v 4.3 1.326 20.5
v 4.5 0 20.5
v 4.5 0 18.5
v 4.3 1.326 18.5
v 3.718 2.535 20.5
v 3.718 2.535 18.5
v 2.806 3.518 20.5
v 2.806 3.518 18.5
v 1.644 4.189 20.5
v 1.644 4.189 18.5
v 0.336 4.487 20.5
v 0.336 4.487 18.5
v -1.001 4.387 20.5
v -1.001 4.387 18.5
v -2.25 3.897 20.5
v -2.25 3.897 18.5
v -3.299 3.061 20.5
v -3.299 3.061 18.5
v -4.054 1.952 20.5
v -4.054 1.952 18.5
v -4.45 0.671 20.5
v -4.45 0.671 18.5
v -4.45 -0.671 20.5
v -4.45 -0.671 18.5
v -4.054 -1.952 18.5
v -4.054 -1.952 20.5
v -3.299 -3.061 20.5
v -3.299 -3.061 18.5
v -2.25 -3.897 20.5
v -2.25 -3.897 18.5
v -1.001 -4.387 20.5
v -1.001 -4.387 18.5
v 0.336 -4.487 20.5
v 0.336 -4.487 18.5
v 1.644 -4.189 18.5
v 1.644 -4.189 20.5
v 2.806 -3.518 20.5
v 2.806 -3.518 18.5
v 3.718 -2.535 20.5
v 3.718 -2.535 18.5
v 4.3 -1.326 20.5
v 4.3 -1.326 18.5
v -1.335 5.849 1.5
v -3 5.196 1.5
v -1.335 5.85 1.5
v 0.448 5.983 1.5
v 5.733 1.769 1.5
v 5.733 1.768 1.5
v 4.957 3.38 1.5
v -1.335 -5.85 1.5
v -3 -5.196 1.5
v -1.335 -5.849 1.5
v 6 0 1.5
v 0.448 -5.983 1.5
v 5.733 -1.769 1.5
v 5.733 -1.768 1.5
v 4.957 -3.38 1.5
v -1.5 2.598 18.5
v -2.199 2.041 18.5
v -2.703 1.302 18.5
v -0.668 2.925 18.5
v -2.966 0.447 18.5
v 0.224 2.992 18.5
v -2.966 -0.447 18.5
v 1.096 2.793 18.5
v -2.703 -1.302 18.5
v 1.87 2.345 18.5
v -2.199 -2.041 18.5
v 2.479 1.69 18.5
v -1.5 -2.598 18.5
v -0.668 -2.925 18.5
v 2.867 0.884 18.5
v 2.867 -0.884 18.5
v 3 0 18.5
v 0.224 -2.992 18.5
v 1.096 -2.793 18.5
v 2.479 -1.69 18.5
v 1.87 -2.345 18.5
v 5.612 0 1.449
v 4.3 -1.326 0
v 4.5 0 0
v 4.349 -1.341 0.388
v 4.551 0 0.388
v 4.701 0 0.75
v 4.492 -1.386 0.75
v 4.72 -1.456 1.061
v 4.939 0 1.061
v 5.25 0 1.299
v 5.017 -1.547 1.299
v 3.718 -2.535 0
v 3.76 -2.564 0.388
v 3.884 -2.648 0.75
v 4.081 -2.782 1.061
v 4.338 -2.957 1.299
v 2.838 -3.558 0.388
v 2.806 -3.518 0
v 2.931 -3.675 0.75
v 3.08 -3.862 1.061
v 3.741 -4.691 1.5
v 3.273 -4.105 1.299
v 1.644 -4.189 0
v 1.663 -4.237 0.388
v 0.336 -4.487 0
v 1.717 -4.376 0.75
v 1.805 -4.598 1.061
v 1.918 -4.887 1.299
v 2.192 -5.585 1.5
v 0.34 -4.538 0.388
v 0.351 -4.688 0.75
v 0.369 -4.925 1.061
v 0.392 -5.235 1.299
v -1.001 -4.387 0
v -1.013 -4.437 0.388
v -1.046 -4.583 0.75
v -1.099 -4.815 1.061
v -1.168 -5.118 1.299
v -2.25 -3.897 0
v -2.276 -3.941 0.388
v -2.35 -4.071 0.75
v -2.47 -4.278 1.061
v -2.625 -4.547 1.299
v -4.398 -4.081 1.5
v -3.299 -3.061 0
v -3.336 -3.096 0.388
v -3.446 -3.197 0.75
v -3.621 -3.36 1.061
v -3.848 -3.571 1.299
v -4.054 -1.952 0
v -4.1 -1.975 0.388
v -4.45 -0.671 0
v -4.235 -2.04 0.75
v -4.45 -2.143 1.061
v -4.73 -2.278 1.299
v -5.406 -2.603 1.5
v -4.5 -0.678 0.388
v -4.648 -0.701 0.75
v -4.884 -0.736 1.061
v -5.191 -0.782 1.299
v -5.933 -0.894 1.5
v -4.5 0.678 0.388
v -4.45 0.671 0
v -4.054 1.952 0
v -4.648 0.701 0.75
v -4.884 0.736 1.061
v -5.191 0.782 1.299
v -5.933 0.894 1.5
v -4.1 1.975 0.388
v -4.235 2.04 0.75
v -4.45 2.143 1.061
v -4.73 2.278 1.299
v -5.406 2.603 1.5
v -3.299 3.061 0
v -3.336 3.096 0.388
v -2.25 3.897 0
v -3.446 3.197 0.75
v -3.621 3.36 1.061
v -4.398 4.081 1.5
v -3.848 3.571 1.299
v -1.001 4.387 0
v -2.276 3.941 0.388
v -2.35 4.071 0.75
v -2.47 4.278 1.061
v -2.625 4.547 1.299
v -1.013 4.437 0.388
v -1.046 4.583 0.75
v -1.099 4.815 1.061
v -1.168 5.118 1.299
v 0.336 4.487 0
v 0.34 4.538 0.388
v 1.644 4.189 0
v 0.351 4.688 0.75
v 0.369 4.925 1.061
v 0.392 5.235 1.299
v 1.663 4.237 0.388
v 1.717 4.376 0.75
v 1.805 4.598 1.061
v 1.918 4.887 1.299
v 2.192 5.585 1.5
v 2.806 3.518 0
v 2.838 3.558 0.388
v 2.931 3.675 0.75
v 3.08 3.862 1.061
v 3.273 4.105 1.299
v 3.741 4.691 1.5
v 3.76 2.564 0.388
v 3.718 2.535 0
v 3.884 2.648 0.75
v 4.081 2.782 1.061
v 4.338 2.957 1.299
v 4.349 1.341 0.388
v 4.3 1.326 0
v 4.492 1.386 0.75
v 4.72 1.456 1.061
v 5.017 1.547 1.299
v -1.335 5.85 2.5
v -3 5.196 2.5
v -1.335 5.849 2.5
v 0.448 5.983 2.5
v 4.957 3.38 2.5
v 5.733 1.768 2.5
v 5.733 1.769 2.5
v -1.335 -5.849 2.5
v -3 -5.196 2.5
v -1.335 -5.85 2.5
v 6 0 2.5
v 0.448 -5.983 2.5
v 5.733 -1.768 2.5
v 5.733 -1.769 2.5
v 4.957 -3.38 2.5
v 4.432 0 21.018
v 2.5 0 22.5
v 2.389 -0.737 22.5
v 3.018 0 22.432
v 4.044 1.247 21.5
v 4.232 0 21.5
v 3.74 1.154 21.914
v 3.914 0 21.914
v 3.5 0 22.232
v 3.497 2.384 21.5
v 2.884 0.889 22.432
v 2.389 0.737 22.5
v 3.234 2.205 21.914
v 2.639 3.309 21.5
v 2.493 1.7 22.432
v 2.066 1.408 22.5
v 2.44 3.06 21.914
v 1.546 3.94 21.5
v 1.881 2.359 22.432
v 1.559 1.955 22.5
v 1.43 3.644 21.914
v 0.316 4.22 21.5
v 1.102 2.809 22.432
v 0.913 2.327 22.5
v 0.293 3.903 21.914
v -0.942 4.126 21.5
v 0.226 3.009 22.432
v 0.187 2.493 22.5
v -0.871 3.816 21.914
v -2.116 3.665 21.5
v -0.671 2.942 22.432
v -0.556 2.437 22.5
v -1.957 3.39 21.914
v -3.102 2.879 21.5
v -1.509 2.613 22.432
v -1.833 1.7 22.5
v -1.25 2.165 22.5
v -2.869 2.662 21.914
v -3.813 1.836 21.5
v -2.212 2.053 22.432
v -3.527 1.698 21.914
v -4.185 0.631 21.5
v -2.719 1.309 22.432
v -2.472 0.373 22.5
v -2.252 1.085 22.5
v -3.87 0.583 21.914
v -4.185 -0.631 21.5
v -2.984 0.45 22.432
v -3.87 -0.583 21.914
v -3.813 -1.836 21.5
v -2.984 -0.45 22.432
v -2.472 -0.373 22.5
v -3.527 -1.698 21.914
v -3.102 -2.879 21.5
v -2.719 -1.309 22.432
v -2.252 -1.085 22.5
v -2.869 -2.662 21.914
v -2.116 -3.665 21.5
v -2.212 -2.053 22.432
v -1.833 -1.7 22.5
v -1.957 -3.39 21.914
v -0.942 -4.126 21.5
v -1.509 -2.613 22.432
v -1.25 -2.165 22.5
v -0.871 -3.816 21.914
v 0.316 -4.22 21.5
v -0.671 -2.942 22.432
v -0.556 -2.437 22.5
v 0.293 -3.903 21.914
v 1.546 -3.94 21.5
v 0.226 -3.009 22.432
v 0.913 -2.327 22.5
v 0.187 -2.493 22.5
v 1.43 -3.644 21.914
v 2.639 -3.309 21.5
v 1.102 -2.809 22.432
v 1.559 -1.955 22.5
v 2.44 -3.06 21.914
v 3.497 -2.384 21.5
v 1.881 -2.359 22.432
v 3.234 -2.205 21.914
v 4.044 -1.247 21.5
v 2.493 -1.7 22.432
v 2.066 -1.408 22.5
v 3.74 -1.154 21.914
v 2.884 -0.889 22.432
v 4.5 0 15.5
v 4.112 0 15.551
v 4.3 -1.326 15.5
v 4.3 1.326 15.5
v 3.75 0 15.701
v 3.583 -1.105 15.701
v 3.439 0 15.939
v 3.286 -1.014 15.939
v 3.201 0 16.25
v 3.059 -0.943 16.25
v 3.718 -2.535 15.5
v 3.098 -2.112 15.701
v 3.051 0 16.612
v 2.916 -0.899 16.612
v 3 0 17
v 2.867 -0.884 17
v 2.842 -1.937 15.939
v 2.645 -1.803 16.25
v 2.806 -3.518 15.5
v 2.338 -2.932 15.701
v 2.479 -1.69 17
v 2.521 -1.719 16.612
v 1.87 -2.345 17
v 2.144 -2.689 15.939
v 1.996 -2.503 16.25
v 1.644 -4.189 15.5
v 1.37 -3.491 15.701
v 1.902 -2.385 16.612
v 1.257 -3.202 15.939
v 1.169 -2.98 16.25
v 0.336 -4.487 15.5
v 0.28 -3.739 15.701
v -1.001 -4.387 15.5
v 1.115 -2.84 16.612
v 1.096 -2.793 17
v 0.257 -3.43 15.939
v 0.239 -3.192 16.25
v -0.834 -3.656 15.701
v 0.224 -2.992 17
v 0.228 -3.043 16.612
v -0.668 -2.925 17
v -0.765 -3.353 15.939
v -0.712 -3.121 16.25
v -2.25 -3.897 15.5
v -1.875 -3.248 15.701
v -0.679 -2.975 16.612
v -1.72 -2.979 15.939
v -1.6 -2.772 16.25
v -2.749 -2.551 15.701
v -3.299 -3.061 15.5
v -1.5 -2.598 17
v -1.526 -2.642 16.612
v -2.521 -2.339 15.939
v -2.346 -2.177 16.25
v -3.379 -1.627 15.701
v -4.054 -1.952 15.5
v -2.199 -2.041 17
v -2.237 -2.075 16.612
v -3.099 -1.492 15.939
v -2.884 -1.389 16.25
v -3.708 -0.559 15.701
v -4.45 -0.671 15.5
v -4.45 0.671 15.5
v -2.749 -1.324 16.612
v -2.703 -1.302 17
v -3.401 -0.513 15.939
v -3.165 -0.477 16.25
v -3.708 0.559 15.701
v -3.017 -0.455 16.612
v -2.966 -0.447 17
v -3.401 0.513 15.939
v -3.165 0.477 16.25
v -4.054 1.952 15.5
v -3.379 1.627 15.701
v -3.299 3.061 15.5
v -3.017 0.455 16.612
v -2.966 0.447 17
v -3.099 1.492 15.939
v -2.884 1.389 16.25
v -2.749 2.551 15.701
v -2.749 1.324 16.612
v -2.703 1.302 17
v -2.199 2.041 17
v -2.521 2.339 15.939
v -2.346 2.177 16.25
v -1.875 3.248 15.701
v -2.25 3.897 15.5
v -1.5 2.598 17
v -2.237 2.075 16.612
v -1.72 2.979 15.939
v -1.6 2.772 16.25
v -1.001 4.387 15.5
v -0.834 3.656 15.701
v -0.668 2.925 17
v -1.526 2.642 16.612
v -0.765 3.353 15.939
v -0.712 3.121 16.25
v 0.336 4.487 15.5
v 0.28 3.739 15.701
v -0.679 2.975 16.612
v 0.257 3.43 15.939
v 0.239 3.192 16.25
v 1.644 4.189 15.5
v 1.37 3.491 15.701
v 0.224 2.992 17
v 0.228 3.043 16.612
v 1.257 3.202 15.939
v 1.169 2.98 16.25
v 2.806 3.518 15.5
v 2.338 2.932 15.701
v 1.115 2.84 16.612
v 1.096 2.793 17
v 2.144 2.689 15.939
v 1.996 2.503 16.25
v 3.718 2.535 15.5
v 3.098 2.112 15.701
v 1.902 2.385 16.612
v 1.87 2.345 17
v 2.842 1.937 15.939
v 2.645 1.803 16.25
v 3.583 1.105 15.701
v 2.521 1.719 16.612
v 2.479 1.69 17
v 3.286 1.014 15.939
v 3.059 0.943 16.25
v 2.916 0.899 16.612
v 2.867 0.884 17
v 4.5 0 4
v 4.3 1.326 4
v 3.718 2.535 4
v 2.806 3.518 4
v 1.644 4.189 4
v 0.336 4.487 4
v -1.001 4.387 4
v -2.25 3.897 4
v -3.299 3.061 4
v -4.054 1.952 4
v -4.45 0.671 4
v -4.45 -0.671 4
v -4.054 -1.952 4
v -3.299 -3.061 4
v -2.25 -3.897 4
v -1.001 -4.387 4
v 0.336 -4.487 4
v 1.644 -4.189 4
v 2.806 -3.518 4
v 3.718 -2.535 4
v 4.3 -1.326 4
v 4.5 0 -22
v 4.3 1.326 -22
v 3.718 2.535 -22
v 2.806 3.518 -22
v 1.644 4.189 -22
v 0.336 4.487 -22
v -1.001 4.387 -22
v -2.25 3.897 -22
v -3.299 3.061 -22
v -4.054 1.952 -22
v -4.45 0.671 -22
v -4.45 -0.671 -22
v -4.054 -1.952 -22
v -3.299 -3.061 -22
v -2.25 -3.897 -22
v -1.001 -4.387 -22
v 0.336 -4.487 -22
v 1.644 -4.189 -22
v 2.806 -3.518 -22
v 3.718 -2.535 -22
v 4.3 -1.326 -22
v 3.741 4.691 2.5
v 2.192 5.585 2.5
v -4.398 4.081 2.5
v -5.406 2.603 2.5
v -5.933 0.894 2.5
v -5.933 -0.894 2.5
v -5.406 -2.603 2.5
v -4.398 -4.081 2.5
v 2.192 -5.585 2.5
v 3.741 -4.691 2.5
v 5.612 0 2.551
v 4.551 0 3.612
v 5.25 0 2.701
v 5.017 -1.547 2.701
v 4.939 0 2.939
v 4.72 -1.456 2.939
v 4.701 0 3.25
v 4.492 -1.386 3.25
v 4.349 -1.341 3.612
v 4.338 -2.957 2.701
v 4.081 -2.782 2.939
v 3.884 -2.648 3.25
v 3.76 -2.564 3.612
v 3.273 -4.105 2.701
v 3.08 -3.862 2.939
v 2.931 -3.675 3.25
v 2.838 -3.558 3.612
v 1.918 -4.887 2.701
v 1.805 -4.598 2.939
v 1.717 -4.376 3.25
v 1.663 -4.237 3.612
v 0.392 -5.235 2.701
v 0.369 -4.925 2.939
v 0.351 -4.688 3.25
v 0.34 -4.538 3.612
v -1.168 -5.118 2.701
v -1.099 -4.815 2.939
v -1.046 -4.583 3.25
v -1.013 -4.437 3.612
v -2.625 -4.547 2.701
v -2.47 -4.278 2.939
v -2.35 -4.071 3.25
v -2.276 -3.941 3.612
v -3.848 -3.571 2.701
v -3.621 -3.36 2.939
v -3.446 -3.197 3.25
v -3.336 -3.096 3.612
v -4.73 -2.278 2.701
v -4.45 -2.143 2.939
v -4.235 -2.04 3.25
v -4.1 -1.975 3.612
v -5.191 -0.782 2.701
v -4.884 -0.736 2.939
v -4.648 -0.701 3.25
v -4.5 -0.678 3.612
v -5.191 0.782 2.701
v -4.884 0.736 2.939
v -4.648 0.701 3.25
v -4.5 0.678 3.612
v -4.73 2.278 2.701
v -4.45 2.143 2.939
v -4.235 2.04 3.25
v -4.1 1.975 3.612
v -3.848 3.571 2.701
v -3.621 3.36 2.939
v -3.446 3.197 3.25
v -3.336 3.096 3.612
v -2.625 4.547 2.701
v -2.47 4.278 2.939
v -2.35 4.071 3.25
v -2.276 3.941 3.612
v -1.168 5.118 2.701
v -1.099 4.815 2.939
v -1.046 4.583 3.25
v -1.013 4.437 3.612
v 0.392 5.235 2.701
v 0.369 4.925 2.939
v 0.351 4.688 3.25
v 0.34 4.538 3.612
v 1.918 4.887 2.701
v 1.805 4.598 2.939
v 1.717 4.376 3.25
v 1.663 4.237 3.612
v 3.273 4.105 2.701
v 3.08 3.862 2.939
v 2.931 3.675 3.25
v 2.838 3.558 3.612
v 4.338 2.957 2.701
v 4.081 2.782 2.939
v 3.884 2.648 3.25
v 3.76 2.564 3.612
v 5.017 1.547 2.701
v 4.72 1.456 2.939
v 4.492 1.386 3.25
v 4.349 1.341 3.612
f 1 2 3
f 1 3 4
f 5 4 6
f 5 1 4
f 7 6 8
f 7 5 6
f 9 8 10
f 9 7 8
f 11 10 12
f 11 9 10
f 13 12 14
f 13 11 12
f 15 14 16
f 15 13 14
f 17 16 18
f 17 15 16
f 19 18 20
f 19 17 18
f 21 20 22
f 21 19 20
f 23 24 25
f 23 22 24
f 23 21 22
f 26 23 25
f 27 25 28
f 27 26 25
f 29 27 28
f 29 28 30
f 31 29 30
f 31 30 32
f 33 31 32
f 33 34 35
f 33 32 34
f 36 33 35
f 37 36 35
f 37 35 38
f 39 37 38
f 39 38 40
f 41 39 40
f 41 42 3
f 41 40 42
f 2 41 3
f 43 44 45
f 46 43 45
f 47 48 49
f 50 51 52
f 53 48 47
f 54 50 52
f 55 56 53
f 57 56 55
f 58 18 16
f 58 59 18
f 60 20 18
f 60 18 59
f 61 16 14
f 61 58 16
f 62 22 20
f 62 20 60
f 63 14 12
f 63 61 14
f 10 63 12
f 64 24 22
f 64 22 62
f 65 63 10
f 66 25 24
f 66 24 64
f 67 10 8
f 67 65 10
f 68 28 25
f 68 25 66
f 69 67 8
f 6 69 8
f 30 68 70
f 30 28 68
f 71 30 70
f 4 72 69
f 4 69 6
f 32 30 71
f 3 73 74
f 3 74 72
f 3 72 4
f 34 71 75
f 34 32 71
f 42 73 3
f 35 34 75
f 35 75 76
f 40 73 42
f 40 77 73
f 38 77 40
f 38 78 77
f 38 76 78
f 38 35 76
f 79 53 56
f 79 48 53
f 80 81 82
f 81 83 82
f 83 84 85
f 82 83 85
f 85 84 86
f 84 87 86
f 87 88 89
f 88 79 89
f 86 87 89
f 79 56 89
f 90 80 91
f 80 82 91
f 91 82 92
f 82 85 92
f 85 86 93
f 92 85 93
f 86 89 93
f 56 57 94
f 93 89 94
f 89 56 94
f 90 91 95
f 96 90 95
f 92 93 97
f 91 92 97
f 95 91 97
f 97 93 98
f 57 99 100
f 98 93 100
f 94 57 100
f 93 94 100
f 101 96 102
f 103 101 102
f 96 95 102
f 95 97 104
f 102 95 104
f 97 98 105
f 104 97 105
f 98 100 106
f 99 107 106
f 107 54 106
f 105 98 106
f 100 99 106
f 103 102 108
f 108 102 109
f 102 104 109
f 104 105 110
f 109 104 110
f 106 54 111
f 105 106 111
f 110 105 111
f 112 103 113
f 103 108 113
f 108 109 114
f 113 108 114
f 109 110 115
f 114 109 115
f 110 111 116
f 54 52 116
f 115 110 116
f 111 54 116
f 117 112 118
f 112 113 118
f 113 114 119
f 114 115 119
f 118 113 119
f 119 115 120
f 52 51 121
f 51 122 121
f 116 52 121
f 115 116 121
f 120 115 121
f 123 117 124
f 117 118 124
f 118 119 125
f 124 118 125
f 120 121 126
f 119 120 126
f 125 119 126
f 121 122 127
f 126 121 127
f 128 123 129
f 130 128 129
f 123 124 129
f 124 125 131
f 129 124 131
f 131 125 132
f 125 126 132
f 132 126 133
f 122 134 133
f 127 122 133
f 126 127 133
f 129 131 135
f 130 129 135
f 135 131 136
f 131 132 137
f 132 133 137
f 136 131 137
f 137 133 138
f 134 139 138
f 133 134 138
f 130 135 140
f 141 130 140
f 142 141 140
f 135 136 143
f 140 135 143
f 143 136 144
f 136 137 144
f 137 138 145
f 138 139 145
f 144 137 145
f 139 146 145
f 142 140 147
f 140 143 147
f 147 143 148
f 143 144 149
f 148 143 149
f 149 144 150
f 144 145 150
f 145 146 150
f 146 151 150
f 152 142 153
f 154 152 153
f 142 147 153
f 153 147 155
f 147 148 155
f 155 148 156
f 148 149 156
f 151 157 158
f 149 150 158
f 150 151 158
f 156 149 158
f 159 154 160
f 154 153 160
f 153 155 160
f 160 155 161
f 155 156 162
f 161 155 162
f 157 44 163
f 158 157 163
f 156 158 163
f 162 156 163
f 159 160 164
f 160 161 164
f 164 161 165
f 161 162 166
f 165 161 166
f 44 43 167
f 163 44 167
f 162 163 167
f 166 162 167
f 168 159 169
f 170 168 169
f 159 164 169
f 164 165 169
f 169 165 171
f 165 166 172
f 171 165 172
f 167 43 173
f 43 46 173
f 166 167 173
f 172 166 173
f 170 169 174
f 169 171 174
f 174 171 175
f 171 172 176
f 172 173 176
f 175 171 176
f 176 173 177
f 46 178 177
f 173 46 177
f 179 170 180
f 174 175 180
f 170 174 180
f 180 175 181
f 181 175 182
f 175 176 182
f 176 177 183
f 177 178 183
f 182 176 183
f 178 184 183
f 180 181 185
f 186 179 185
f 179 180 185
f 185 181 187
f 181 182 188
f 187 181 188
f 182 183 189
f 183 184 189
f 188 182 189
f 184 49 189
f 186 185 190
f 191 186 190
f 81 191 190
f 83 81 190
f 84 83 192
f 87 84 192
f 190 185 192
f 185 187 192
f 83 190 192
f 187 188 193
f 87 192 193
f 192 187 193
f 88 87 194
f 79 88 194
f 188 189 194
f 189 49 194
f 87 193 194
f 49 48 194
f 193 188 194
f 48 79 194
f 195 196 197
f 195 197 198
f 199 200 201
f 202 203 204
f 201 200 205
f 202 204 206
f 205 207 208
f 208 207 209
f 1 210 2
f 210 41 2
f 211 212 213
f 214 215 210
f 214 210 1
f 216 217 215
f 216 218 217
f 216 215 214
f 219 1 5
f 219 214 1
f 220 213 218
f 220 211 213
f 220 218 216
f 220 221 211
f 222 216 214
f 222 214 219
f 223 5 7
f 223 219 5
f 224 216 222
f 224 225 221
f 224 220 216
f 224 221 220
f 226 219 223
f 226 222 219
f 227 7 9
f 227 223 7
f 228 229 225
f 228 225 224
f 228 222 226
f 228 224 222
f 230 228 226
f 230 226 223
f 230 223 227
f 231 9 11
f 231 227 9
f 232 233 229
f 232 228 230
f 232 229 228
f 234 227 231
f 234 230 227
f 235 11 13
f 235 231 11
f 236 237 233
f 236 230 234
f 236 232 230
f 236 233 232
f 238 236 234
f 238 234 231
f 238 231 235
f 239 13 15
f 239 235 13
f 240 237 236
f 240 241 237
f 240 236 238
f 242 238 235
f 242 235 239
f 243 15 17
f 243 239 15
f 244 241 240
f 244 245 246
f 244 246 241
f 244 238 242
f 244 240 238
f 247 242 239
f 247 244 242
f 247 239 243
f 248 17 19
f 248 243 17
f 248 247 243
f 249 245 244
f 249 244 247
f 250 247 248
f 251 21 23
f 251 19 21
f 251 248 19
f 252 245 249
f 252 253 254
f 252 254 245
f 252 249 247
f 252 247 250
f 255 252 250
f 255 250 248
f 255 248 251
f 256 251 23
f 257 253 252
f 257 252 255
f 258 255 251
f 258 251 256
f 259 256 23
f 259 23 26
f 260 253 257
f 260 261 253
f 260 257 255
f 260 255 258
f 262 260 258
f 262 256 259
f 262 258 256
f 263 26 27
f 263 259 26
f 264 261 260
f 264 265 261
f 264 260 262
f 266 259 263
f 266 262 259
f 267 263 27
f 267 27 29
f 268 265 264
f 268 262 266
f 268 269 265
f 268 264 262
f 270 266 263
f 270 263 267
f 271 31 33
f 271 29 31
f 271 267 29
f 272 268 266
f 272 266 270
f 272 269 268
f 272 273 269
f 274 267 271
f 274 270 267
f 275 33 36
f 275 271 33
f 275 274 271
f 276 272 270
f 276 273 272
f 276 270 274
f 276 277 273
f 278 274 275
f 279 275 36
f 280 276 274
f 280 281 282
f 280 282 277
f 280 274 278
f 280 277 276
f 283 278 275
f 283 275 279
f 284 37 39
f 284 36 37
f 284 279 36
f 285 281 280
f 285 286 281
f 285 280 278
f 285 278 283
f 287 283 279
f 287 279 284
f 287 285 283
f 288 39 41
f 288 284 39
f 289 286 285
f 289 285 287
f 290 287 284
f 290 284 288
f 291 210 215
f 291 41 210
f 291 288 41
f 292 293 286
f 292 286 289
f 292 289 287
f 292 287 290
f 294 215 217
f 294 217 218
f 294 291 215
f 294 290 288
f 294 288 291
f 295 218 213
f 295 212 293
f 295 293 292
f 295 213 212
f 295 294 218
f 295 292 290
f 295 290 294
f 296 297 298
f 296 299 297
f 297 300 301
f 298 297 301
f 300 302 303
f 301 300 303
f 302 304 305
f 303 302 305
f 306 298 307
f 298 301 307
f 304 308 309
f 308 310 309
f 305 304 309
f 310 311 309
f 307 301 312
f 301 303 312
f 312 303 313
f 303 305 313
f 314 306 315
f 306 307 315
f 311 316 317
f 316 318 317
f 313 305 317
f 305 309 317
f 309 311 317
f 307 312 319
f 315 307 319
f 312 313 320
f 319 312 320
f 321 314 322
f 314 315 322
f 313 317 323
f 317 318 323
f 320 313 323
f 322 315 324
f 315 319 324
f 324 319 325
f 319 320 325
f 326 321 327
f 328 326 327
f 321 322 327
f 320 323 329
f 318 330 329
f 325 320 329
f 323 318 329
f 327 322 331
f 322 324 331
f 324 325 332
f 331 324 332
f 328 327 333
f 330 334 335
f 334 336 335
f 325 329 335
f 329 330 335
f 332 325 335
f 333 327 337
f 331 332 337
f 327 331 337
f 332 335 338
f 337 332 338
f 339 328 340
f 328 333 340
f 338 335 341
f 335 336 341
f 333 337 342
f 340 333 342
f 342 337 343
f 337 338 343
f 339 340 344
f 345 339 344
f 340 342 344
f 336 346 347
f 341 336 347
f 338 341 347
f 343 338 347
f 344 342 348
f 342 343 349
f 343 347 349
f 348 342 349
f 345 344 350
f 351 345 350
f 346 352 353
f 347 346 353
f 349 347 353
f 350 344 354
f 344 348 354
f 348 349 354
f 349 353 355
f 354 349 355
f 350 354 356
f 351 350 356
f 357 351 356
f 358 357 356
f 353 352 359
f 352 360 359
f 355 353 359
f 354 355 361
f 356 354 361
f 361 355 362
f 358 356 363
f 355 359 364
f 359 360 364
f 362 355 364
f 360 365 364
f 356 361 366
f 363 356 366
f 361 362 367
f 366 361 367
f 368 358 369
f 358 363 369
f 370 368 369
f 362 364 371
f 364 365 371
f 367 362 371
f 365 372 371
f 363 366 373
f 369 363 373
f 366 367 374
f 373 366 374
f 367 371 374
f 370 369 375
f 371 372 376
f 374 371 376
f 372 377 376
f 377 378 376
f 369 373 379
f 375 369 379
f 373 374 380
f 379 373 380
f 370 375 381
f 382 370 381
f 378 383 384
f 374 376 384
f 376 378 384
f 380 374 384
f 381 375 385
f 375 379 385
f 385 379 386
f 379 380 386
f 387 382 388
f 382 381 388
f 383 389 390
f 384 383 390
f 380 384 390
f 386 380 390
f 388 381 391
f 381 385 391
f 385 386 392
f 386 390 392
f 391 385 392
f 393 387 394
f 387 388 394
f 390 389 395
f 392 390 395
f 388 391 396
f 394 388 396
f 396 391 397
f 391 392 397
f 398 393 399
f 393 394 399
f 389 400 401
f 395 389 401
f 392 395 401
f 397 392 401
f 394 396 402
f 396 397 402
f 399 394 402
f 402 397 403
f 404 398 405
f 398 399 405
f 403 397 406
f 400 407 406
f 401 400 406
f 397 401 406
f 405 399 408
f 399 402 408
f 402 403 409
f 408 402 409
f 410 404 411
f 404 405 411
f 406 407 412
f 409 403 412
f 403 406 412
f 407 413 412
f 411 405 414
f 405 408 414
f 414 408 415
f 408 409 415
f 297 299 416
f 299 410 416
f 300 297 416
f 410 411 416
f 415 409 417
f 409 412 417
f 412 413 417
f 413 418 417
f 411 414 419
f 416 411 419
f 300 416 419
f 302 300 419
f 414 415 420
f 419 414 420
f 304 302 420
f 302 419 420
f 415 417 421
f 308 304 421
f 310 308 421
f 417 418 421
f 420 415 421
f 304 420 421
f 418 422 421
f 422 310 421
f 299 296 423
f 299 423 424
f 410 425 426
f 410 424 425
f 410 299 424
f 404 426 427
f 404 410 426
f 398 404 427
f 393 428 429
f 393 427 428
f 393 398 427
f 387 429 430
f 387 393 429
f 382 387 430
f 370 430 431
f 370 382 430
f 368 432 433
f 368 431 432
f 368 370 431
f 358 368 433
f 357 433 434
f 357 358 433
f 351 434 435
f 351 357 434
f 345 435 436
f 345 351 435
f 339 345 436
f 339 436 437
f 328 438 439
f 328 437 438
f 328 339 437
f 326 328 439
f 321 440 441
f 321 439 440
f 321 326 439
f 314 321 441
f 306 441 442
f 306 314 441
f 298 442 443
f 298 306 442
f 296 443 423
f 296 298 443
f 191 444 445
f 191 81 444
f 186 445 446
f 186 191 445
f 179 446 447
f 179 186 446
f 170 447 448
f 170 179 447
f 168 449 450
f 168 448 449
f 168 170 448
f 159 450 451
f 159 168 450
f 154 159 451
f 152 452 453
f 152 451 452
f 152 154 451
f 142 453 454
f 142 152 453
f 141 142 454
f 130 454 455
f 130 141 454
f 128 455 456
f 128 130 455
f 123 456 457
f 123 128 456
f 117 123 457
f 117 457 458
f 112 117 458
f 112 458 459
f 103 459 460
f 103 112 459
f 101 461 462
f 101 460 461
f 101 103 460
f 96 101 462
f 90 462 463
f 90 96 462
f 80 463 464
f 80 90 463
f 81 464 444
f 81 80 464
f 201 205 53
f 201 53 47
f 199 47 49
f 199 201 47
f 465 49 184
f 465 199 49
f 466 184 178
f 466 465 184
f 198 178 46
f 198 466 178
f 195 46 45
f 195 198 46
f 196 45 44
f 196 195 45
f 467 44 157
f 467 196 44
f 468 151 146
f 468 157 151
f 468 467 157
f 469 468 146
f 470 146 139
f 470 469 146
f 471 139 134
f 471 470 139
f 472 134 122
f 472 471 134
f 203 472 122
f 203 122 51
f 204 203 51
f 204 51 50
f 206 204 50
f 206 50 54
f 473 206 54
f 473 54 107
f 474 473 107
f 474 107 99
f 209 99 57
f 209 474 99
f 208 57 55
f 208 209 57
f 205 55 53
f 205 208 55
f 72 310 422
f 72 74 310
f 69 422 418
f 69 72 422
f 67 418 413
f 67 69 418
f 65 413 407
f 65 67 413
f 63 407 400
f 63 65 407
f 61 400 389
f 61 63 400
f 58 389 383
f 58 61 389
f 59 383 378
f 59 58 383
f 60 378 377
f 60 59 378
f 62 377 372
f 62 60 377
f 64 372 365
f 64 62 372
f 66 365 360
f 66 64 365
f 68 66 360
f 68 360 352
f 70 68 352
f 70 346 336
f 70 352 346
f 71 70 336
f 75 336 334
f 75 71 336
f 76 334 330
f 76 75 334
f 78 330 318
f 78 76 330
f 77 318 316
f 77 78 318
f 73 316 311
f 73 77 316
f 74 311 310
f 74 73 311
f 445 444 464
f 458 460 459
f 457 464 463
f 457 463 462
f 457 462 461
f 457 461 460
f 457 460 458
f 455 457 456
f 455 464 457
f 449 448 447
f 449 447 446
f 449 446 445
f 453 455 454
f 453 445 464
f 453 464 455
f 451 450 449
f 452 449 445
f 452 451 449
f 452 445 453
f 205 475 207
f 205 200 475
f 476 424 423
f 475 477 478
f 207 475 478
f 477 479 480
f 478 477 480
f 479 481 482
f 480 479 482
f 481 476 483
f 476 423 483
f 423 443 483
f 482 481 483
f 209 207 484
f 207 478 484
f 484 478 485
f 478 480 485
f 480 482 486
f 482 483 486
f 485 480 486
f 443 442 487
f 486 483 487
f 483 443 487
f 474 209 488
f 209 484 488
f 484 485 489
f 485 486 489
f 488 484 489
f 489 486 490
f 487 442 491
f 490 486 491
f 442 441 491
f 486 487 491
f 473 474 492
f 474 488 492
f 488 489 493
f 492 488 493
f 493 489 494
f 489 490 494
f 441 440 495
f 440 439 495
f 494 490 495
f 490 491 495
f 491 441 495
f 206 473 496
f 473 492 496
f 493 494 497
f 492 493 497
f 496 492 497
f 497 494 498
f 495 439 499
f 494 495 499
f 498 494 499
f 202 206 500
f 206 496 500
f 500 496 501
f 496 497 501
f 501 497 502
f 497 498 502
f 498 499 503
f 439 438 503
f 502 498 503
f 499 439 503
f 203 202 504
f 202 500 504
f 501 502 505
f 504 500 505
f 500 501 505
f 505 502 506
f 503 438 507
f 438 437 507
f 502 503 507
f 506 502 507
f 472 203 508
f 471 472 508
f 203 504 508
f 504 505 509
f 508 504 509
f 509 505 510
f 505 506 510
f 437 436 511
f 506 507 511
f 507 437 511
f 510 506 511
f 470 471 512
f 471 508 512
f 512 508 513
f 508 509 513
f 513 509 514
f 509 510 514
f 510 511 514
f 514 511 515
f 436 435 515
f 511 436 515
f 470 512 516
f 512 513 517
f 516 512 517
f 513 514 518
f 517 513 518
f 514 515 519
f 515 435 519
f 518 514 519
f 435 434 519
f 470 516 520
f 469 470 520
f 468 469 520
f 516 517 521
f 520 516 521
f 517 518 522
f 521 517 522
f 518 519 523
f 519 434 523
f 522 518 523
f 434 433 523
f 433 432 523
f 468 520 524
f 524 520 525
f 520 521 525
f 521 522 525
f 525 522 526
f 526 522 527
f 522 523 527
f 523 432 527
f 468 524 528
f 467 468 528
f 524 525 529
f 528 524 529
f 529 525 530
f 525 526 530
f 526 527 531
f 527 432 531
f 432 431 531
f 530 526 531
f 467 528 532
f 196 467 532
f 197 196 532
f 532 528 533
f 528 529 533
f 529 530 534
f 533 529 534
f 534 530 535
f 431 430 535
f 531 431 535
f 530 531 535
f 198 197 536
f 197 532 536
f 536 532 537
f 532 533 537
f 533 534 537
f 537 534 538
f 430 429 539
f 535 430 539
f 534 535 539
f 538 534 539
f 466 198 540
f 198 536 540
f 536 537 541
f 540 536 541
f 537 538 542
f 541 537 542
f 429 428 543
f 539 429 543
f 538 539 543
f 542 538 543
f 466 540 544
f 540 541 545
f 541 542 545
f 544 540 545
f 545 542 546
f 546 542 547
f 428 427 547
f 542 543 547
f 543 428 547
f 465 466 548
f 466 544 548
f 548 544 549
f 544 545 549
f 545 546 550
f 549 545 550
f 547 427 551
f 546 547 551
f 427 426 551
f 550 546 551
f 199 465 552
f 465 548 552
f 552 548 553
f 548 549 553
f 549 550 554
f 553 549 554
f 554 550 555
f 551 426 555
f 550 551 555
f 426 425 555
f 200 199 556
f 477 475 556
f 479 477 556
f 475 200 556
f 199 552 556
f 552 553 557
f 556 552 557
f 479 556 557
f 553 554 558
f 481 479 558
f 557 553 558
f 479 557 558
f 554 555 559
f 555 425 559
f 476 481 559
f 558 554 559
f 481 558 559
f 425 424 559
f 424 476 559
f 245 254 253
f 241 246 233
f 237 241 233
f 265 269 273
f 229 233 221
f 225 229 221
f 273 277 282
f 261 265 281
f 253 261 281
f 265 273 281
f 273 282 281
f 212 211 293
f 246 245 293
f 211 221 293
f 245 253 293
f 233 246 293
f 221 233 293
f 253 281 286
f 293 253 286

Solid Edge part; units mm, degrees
sketch "Sketch1" plane through (0, 0, 0) normal (0, -1, 0) x (1, 0, 0)
  line L0 (4.5, 18.5) -> (4.5, 22.5)
  line L1 (4.5, 22.5) -> (0, 22.5)
  line L2 (0, 22.5) -> (0, 0)
  line L3 (0, 0) -> (4.5, 0)
  line L4 (4.5, 0) -> (4.5, 1.5)
  line L5 (4.5, 1.5) -> (6, 1.5)
  line L6 (6, 1.5) -> (6, 2.5)
  line L7 (6, 2.5) -> (4.5, 2.5)
  line L8 (4.5, 2.5) -> (4.5, 15.5)
  line L9 (4.5, 15.5) -> (3, 15.5)
  line L10 (3, 15.5) -> (3, 18.5)
  line L11 (3, 18.5) -> (4.5, 18.5)
revolve "RevolvedProtrusion1" add sketch "Sketch1" angle 360 about axis through (0, 0, 22.5) along (0, 0, -1)
fillet "Round1" radius 1.5 3 edges at (-3, 0, 15.5) (-4.5, 0, 2.5) (-4.5, 0, 1.5)
fillet "Round_2" radius 2 1 edges at (-4.5, 0, 22.5)
sketch "Sketch2" plane through (0, 0, 0) normal (0, 0, -1) x (1, 0, 0)
  circle A0 centre (0, 0) radius 4.5
extrude "ProtrusiónExtruida_1" add sketch "Sketch2" along normal blind 22
